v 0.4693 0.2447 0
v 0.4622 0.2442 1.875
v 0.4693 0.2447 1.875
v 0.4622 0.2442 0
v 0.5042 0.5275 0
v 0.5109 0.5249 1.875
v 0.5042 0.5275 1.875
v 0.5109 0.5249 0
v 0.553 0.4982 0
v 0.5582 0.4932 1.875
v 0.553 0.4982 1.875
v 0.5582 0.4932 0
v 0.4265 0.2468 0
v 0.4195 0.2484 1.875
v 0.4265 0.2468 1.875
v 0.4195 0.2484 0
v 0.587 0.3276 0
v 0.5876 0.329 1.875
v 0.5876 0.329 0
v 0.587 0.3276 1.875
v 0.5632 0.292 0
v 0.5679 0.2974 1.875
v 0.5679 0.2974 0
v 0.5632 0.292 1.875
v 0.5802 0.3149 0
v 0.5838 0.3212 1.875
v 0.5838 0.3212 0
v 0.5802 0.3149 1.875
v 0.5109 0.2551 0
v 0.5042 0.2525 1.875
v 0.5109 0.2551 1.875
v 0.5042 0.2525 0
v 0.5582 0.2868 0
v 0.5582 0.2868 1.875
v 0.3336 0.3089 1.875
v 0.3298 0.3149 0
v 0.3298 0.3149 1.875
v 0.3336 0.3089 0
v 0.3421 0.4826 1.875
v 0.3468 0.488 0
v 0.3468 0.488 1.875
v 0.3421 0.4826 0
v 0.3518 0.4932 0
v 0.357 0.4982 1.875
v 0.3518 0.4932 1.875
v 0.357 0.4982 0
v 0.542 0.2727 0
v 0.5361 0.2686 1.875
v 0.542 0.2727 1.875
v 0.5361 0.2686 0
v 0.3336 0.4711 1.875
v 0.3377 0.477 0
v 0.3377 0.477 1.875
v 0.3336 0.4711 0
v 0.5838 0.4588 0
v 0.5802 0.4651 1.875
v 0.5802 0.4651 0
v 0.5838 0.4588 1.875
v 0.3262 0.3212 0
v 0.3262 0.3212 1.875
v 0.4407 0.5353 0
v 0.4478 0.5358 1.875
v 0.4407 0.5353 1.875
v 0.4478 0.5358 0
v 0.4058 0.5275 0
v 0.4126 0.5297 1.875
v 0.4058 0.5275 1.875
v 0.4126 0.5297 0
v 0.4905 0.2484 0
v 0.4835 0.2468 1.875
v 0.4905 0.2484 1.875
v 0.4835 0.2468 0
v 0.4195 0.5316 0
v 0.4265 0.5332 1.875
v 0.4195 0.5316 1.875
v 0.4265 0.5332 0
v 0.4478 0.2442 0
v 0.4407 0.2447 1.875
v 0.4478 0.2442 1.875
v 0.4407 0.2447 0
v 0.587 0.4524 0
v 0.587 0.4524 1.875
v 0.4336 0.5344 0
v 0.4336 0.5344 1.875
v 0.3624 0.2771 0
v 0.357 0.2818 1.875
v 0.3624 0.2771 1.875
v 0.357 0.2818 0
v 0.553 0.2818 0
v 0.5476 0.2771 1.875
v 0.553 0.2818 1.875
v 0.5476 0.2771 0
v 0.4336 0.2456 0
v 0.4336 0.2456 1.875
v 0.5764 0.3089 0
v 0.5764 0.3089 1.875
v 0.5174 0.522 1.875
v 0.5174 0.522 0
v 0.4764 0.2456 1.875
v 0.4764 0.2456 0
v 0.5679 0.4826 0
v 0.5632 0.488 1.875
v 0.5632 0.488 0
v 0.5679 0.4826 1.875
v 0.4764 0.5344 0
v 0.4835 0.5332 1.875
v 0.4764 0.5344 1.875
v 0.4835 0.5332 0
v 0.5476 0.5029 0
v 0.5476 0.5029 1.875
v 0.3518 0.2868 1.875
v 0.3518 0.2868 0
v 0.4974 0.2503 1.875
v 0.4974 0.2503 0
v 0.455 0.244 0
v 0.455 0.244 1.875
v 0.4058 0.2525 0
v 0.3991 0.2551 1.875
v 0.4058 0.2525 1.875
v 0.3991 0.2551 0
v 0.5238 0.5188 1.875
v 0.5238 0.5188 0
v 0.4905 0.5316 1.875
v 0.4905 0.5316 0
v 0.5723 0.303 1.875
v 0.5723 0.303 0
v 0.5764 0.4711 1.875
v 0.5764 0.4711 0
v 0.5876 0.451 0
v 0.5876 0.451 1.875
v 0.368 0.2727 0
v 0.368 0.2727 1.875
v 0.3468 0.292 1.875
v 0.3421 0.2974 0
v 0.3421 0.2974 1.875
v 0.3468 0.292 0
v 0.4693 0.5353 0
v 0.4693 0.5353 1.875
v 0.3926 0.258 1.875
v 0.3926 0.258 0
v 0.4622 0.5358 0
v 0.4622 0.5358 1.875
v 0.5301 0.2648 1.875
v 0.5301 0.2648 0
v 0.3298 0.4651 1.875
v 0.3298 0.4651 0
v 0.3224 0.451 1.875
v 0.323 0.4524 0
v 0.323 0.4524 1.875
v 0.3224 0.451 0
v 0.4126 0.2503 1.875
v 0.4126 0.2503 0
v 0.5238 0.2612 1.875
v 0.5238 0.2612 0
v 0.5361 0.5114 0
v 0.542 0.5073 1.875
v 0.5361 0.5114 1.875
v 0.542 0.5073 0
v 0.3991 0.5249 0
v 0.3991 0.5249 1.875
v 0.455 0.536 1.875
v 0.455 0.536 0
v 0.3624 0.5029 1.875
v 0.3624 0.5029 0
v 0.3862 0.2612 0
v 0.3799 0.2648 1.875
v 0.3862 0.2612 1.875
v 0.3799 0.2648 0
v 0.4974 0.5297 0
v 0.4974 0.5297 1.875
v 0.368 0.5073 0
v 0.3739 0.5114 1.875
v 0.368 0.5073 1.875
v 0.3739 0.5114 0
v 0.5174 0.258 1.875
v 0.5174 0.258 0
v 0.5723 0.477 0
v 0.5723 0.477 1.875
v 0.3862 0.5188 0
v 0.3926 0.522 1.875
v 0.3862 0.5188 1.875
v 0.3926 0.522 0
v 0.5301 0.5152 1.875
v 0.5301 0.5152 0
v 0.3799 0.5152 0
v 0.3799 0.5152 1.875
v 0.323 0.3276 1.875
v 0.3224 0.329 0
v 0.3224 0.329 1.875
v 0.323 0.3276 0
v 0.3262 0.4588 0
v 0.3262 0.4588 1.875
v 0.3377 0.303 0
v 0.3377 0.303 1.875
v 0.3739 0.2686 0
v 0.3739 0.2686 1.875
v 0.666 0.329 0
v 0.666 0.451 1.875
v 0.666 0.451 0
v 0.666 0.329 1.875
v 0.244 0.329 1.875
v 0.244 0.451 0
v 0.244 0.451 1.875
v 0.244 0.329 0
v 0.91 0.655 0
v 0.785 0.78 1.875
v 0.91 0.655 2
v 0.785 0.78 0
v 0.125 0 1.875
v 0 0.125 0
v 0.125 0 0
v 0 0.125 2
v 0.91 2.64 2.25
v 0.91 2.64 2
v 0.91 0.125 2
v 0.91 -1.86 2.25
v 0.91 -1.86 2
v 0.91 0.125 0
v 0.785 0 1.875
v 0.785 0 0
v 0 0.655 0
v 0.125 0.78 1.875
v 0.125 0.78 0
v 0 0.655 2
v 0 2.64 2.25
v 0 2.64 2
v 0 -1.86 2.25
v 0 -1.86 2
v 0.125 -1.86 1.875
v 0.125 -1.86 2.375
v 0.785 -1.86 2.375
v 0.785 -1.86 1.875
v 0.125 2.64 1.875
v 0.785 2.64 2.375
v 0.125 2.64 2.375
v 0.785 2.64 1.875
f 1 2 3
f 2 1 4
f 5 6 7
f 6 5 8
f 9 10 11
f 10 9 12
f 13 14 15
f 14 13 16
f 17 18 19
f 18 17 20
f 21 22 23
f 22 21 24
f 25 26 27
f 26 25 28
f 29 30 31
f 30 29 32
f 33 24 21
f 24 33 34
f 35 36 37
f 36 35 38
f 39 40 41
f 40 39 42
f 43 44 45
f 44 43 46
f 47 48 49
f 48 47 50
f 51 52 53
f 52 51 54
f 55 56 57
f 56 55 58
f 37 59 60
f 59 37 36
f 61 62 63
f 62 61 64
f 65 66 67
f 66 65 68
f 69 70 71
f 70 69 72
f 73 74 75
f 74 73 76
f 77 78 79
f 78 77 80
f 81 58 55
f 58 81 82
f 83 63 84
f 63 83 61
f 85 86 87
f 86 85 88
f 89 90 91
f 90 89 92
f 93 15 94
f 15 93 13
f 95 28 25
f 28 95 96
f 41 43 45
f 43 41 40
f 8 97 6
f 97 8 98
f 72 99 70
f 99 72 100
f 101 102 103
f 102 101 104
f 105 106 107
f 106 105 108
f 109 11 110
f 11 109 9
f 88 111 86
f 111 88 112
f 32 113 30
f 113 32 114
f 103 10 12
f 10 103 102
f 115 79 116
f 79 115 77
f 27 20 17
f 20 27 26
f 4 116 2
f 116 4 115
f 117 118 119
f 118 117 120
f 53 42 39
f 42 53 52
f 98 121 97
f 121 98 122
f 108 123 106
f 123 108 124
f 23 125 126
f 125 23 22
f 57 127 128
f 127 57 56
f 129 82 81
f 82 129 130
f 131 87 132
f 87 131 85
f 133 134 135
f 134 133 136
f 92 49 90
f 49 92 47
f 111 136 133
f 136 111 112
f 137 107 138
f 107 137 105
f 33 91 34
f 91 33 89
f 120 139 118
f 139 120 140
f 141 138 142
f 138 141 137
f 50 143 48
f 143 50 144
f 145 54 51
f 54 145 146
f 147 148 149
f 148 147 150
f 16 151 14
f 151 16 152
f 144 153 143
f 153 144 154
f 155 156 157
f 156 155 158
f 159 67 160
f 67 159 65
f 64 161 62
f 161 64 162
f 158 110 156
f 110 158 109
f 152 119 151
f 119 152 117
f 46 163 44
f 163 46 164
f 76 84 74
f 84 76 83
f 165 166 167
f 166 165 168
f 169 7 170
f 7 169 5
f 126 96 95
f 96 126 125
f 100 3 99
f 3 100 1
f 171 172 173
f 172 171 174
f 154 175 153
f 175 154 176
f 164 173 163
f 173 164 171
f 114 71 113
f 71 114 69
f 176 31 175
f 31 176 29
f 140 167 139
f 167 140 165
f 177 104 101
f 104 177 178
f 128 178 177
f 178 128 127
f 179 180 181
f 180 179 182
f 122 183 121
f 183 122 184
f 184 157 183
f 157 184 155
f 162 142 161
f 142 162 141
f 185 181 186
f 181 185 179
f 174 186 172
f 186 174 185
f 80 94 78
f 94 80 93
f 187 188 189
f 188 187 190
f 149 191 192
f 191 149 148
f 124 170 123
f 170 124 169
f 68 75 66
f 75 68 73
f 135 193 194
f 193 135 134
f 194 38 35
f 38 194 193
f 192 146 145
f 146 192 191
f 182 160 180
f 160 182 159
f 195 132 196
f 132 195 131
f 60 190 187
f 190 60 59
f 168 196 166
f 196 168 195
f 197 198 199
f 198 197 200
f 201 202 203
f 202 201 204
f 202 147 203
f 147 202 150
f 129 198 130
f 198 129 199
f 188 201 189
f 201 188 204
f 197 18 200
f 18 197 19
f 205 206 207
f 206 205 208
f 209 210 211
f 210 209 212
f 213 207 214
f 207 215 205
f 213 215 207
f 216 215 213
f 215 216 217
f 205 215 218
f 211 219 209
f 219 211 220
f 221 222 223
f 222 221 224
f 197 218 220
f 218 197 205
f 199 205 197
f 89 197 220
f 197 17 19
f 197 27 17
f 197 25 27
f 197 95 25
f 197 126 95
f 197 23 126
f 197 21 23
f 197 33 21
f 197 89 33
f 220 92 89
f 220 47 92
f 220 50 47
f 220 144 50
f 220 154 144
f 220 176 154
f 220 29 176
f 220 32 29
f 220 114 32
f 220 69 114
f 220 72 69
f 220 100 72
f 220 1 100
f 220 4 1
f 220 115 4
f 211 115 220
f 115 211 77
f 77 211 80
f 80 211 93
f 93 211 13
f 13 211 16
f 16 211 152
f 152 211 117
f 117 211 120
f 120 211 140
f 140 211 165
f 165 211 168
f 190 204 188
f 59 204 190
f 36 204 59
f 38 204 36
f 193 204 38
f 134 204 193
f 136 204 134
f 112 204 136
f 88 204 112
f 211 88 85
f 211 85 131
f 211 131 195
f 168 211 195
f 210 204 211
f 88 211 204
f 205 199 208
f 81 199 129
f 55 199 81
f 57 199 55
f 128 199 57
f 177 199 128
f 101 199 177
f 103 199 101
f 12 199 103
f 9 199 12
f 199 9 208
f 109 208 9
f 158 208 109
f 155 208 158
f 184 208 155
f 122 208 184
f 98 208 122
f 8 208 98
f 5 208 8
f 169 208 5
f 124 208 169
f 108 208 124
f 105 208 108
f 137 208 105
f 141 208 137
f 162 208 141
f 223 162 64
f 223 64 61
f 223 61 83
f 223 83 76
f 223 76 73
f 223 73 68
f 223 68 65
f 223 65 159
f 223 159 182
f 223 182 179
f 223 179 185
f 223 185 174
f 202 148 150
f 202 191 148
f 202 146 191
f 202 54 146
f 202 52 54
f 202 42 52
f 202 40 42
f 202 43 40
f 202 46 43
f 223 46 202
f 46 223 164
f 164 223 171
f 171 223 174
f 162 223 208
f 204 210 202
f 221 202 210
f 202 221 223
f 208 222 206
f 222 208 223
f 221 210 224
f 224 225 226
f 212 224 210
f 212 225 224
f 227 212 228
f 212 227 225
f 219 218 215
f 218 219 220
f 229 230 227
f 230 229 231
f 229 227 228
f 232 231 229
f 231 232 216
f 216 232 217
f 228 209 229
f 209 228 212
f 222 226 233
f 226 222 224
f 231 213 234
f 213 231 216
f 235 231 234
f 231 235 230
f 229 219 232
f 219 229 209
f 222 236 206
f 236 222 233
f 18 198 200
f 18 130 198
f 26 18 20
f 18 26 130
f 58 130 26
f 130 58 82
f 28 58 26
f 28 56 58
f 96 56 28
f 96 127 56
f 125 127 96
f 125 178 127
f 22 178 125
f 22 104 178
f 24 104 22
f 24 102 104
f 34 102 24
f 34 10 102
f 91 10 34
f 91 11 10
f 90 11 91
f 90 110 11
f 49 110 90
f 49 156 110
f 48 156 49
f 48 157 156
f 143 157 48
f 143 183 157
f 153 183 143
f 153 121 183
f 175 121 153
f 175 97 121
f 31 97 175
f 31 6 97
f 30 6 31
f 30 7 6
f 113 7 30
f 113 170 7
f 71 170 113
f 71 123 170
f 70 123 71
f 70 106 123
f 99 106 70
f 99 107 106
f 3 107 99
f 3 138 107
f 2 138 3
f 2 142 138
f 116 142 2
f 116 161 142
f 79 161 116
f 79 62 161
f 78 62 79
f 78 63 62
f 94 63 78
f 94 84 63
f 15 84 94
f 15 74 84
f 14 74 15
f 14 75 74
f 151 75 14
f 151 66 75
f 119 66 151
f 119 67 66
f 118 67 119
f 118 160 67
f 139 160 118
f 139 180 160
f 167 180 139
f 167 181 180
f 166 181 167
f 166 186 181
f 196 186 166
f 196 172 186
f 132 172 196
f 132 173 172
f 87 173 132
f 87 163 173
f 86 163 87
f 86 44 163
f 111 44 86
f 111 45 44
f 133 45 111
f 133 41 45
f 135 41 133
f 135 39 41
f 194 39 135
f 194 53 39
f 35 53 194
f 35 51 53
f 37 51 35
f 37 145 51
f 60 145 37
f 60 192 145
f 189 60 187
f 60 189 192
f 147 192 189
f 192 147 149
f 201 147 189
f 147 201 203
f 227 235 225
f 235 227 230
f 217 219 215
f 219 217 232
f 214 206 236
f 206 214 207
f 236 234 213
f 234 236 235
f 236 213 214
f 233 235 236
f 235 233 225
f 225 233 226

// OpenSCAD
// file: xcelite-99-blade-case.scad
/*
 * Copyright (c) 2021 Peter Piwowarski <peterjpiwowarski@gmail.com>
 *
 * Permission to use, copy, modify, and distribute this model for any
 * purpose with or without fee is hereby granted, provided that the above
 * copyright notice and this permission notice appear in all copies.
 *
 * THE MODEL IS PROVIDED "AS IS" AND THE AUTHOR DISCLAIMS ALL WARRANTIES
 * WITH REGARD TO THIS MODEL INCLUDING ALL IMPLIED WARRANTIES OF
 * MERCHANTABILITY AND FITNESS. IN NO EVENT SHALL THE AUTHOR BE LIABLE FOR
 * ANY SPECIAL, DIRECT, INDIRECT, OR CONSEQUENTIAL DAMAGES OR ANY DAMAGES
 * WHATSOEVER RESULTING FROM LOSS OF USE, DATA OR PROFITS, WHETHER IN AN
 * ACTION OF CONTRACT, NEGLIGENCE OR OTHER TORTIOUS ACTION, ARISING OUT OF
 * OR IN CONNECTION WITH THE USE OR PERFORMANCE OF THIS MODEL.
 */

include <common.scad>

$fn = 128;

module xcelite_99_blade_socket(
	blade_base_dia,
	blade_wingspan,
	blade_wing_thickness,
	depth
)
{
	blade_base_rad = blade_base_dia / 2;
	translate([0, 0, depth / 2])
	{
		union()
		{
			cylinder(d = blade_base_dia, h = depth, center = true);
			cube([
				blade_wingspan,
				blade_wing_thickness,
				depth
			], center = true);
		}
	}
}

module xcelite_99_blade_case(
	no_blades = no_blades,
	// Increase for tools with heads bigger than the handle's socket.
	tool_spacing_x = tool_spacing_x,
	tool_spacing_y = tool_spacing_y,
	// Increase for small values of tool_spacing_*
	outside_pad = outside_pad,
	wall_z = wall_thickness,
	cap_inset_depth = cap_thickness + cap_clearance,
	cap_inset_height = cap_overlap,

	blade_base_dia = blade_base_dia,
	/*
	 * wingspan: max distance from one wing's outer surface to the other:
	 *
	 *      ___
	 *  ___/ ^ \_______
	 * |___  |  _______--------
	 *     \_v_/
	 */
	blade_wingspan = blade_wingspan,
	blade_wing_thickness = blade_wing_thickness,
	// 0 is wingtip-to-wingtip, 90 is flat-to-flat.
	blade_angle = blade_angle,
	socket_depth = socket_depth,
	socket_clearance = socket_clearance,
	followthrough = 0.01
)
{
	slop = 2 * socket_clearance;
	swidth = socket_width(blade_base_dia, blade_wingspan, blade_wing_thickness, blade_angle) + slop;
	sheight = socket_height(blade_base_dia, blade_wingspan, blade_wing_thickness, blade_angle) + slop;
	sidewall_x = max(tool_spacing_x, outside_pad);
	sidewall_y = max(tool_spacing_y, outside_pad);
	bottom_sidewall_x = sidewall_x + cap_inset_depth;
	bottom_sidewall_y = sidewall_y + cap_inset_depth;

	difference()
	{
		union()
		{
			if(cap_inset_height > 0)
			{
				translate([
					cap_inset_depth,
					cap_inset_depth,
					socket_depth + wall_z - cap_inset_height - followthrough
				])
				{
					cube([
						swidth * no_blades + (no_blades - 1) * tool_spacing_x + 2 * sidewall_x,
						sheight + 2 * sidewall_y,
						cap_inset_height + followthrough
					]);
				}
			}
			cube([
				swidth * no_blades + tool_spacing_x * (no_blades - 1) + 2 * bottom_sidewall_x,
				sheight + 2 * bottom_sidewall_y,
				socket_depth + wall_z - cap_inset_height
			]);
		}
		union()
		{
			for (offs = [
				bottom_sidewall_x + swidth / 2 :
				swidth + tool_spacing_x :
				bottom_sidewall_x + no_blades * (swidth + tool_spacing_x)
			])
			{
				translate([
					offs,
					bottom_sidewall_y + sheight / 2,
					wall_z
				])
				{
					rotate([0, 0, blade_angle])
					{
						xcelite_99_blade_socket(
							blade_base_dia + slop,
							blade_wingspan + slop,
							blade_wing_thickness + slop,
							socket_depth + followthrough
						);
					}
				}
			}
		}
	}
}

xcelite_99_blade_case();
// file: common.scad
/*
 * Copyright (c) 2021 Peter Piwowarski <peterjpiwowarski@gmail.com>
 *
 * Permission to use, copy, modify, and distribute this model for any
 * purpose with or without fee is hereby granted, provided that the above
 * copyright notice and this permission notice appear in all copies.
 *
 * THE MODEL IS PROVIDED "AS IS" AND THE AUTHOR DISCLAIMS ALL WARRANTIES
 * WITH REGARD TO THIS MODEL INCLUDING ALL IMPLIED WARRANTIES OF
 * MERCHANTABILITY AND FITNESS. IN NO EVENT SHALL THE AUTHOR BE LIABLE FOR
 * ANY SPECIAL, DIRECT, INDIRECT, OR CONSEQUENTIAL DAMAGES OR ANY DAMAGES
 * WHATSOEVER RESULTING FROM LOSS OF USE, DATA OR PROFITS, WHETHER IN AN
 * ACTION OF CONTRACT, NEGLIGENCE OR OTHER TORTIOUS ACTION, ARISING OUT OF
 * OR IN CONNECTION WITH THE USE OR PERFORMANCE OF THIS MODEL.
 */

include <MCAD/constants.scad>

no_blades = 6;
blade_base_dia = 0.280;
blade_wingspan = 0.410; // See xcelite-99-blade-case.scad
blade_wing_thickness = 0.110;
blade_angle = 90; // 0 for minimum depth, 90 for minimum width
blade_overall_length = 5;
wall_thickness = 0.075;

/*
 * Increase for tools with heads bigger than the handle's socket. Set negative
 * to pack tools closer together for angles other than 0 or 90.
 */
tool_spacing_x = 0.025;
tool_spacing_y = wall_thickness;

// Increase for small values of tool_spacing_*_def
outside_pad = wall_thickness;


// Single perimeter with a 0.4mm nozzle, for vase mode
// cap_thickness = 0.45 / mm_per_inch;
cap_thickness = 0.075;
cap_clearance = 0.003;
cap_overlap = 1;
solid_cap = 0;

socket_clearance = 0.007;
socket_depth = 1.5;

function socket_width(blade_base_dia, blade_wingspan, blade_wing_thickness, blade_angle)
	= max(blade_base_dia, cos(blade_angle) * blade_wingspan + cos(90 - blade_angle) * blade_wing_thickness);

function socket_height(blade_base_dia, blade_wingspan, blade_wing_thickness, blade_angle)
	= max(blade_base_dia, sin(blade_angle) * blade_wingspan + sin(90 - blade_angle) * blade_wing_thickness);
// main file
include <common.scad>
use <xcelite-99-blade-case.scad>

$fn = 128;
followthrough = 0.01;

socket_pad = 0.5;
tee_y = 4.5;
center_z = 2.25;
tee_z = 0.5;
chamfer = 0.125;
// *not* multiplied by two like the "clearances"
handle_slop = 0.012;

module chamfer_square(x, y, chamfer, z)
{
	linear_extrude(z)
	{
		polygon([
			[0, chamfer],
			[chamfer, 0],
			[x - chamfer, 0],
			[x, chamfer],
			[x, y - chamfer],
			[x - chamfer, y],
			[chamfer, y],
			[0, y - chamfer]
		]);
	}
}

module t_handle(
	blade_wingspan = blade_wingspan,
	blade_base_dia = blade_base_dia,
	tee_y = tee_y,
	center_z = center_z,
	tee_z = tee_z,
	chamfer = chamfer,
	blade_clearance = handle_slop,
	socket_pad = socket_pad
)
{
	x = blade_wingspan + socket_pad;
	center_y = blade_base_dia + socket_pad;
	union()
	{
		difference()
		{
			chamfer_square(x, center_y, chamfer, center_z);
			translate([x / 2, center_y / 2, -followthrough])
			{
				xcelite_99_blade_socket(
					blade_base_dia + blade_clearance,
					blade_wingspan + blade_clearance,
					blade_wing_thickness + blade_clearance,
					center_z - 0.25 + followthrough
				);
			}
		}
		translate([0, (tee_y + center_y) / 2, center_z - tee_z + chamfer])
		{
			rotate([90, 0, 0])
			{
				chamfer_square(x, tee_z, chamfer, tee_y);
			}
		}
	}
}

t_handle();
